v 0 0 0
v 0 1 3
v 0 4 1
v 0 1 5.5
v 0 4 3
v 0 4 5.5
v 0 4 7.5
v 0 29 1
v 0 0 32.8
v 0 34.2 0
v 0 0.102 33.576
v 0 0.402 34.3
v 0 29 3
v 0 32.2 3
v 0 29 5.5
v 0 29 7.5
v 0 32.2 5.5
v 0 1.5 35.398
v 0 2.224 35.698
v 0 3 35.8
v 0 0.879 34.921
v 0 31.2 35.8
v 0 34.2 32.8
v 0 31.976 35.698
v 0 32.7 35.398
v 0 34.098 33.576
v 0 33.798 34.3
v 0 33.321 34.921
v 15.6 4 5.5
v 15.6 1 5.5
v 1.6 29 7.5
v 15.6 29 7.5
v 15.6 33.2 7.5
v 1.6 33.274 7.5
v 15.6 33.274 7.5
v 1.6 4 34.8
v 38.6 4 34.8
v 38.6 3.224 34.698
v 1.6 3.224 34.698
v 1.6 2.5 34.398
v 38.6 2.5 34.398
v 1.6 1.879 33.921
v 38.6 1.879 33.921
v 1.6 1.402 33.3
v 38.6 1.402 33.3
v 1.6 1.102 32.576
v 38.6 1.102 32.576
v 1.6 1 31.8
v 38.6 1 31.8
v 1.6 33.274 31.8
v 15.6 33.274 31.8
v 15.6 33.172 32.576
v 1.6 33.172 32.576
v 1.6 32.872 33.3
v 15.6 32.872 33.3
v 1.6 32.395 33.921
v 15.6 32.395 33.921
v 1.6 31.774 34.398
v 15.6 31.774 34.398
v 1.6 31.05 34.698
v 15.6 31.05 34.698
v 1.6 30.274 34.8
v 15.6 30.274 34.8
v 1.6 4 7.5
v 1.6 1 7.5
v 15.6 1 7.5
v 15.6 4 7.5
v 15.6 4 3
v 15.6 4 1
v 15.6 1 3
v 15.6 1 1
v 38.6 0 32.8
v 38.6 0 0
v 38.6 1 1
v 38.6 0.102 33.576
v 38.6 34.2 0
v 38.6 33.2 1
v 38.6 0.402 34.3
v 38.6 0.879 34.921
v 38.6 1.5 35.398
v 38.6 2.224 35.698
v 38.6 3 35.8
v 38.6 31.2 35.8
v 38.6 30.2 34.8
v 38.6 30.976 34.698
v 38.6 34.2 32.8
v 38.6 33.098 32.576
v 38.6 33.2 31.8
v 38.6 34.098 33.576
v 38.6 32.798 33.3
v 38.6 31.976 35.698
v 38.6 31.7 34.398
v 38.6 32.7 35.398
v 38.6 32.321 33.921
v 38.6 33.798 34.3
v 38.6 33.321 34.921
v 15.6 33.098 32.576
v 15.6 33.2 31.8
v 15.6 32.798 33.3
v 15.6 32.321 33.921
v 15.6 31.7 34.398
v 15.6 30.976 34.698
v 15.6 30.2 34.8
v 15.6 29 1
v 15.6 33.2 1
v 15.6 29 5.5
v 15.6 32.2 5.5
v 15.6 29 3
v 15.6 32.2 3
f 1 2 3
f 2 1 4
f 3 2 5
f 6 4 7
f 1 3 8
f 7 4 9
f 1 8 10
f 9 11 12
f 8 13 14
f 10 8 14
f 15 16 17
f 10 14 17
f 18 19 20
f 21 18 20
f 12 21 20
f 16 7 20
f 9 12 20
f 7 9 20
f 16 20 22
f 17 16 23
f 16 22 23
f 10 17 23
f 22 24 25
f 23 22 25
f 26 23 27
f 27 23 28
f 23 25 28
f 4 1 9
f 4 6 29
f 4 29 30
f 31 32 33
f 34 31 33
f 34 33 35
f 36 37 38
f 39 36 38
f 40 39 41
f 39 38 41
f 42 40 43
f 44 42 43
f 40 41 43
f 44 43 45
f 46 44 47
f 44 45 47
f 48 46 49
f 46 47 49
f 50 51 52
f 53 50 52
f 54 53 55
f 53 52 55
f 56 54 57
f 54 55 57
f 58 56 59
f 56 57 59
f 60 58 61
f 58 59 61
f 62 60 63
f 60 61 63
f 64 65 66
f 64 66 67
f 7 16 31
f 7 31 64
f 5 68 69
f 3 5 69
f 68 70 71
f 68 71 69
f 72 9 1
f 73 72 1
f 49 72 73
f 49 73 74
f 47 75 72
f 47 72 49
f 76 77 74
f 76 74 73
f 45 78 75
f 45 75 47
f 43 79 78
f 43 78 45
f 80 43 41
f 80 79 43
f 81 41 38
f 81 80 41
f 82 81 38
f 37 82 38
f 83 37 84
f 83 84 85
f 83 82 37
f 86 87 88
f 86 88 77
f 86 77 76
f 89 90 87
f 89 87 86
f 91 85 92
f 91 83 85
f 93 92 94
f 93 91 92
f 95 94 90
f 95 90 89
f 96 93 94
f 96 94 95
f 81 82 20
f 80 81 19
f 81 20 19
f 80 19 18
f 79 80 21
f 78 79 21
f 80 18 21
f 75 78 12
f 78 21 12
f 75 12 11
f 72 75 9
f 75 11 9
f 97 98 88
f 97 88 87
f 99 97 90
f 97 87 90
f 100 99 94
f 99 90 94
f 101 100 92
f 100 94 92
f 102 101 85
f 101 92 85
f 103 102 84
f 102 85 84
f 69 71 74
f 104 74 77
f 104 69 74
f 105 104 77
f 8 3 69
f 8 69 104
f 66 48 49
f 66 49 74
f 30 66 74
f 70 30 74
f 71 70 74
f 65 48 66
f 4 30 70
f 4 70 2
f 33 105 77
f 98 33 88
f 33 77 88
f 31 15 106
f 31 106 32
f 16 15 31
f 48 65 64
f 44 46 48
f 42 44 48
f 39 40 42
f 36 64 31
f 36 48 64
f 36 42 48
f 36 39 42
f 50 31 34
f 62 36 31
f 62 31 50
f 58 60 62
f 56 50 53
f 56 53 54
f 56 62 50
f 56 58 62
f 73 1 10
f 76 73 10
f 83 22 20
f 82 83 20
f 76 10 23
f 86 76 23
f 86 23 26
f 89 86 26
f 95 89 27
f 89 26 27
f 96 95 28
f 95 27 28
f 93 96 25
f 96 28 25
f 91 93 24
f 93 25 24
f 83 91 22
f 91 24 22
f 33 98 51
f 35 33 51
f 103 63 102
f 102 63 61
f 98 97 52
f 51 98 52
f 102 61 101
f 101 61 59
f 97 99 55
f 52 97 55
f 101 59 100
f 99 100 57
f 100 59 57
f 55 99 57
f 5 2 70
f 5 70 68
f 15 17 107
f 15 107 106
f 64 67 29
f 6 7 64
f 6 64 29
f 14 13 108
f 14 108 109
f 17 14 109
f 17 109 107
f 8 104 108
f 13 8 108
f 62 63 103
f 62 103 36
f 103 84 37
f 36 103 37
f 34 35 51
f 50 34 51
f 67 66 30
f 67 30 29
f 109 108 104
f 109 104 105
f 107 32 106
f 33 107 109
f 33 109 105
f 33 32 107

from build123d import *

# Parameters (mm, degrees)
PAD_DEPTH       = 38.6
POCKET_DEPTH    = 16
POCKET001_DEPTH = 23
POCKET002_DEPTH = 14


with BuildPart() as part:
    # Sketch → Pad (new body)
    with BuildSketch(Plane.YZ):
        with BuildLine():
            Line((0, 0), (34.2, 0))
            Line((34.2, 0), (34.2, 32.8))
            ThreePointArc((34.2, 32.8), (33.32132, 34.92132), (31.2, 35.8))
            Line((31.2, 35.8), (3, 35.8))
            ThreePointArc((3, 35.8), (0.87868, 34.92132), (0, 32.8))
            Line((0, 32.8), (0, 0))
        make_face()
    extrude(amount=PAD_DEPTH)

    # Sketch001 (on Face7 of Pad) → Pocket (cut)
    with BuildSketch(Plane(origin=(0, 0, 0), x_dir=(0, 1, 0), z_dir=(-1, 0, 0))):
        Polygon((4, -3), (4, -1), (29, -1), (29, -3), (32.2, -3), (32.2, -5.5), (29, -5.5), (29, -7.5), (4, -7.5), (4, -5.5), (1, -5.5), (1, -3), align=None)
    extrude(amount=-POCKET_DEPTH, mode=Mode.SUBTRACT)

    # Sketch002 (on Face5 of Pocket) → Pocket001 (cut)
    with BuildSketch(Plane.YZ.offset(38.6)):
        with BuildLine():
            Line((1, 1), (33.2, 1))
            Line((33.2, 1), (33.2, 31.8))
            ThreePointArc((33.2, 31.8), (32.32132, 33.92132), (30.2, 34.8))
            Line((30.2, 34.8), (4, 34.8))
            ThreePointArc((4, 34.8), (1.87868, 33.92132), (1, 31.8))
            Line((1, 31.8), (1, 1))
        make_face()
    extrude(amount=-POCKET001_DEPTH, mode=Mode.SUBTRACT)

    # Sketch003 (on Face29 of Pocket001) → Pocket002 (cut)
    with BuildSketch(Plane.YZ.offset(15.6)):
        with BuildLine():
            Line((1, 7.5), (33.273769, 7.5))
            Line((33.273769, 7.5), (33.273769, 31.8))
            ThreePointArc((33.273769, 31.8), (32.395089, 33.92132), (30.273769, 34.8))
            Line((30.273769, 34.8), (4, 34.8))
            ThreePointArc((4, 34.8), (1.87868, 33.92132), (1, 31.8))
            Line((1, 31.8), (1, 7.5))
        make_face()
    extrude(amount=-POCKET002_DEPTH, mode=Mode.SUBTRACT)


solid = part.part
